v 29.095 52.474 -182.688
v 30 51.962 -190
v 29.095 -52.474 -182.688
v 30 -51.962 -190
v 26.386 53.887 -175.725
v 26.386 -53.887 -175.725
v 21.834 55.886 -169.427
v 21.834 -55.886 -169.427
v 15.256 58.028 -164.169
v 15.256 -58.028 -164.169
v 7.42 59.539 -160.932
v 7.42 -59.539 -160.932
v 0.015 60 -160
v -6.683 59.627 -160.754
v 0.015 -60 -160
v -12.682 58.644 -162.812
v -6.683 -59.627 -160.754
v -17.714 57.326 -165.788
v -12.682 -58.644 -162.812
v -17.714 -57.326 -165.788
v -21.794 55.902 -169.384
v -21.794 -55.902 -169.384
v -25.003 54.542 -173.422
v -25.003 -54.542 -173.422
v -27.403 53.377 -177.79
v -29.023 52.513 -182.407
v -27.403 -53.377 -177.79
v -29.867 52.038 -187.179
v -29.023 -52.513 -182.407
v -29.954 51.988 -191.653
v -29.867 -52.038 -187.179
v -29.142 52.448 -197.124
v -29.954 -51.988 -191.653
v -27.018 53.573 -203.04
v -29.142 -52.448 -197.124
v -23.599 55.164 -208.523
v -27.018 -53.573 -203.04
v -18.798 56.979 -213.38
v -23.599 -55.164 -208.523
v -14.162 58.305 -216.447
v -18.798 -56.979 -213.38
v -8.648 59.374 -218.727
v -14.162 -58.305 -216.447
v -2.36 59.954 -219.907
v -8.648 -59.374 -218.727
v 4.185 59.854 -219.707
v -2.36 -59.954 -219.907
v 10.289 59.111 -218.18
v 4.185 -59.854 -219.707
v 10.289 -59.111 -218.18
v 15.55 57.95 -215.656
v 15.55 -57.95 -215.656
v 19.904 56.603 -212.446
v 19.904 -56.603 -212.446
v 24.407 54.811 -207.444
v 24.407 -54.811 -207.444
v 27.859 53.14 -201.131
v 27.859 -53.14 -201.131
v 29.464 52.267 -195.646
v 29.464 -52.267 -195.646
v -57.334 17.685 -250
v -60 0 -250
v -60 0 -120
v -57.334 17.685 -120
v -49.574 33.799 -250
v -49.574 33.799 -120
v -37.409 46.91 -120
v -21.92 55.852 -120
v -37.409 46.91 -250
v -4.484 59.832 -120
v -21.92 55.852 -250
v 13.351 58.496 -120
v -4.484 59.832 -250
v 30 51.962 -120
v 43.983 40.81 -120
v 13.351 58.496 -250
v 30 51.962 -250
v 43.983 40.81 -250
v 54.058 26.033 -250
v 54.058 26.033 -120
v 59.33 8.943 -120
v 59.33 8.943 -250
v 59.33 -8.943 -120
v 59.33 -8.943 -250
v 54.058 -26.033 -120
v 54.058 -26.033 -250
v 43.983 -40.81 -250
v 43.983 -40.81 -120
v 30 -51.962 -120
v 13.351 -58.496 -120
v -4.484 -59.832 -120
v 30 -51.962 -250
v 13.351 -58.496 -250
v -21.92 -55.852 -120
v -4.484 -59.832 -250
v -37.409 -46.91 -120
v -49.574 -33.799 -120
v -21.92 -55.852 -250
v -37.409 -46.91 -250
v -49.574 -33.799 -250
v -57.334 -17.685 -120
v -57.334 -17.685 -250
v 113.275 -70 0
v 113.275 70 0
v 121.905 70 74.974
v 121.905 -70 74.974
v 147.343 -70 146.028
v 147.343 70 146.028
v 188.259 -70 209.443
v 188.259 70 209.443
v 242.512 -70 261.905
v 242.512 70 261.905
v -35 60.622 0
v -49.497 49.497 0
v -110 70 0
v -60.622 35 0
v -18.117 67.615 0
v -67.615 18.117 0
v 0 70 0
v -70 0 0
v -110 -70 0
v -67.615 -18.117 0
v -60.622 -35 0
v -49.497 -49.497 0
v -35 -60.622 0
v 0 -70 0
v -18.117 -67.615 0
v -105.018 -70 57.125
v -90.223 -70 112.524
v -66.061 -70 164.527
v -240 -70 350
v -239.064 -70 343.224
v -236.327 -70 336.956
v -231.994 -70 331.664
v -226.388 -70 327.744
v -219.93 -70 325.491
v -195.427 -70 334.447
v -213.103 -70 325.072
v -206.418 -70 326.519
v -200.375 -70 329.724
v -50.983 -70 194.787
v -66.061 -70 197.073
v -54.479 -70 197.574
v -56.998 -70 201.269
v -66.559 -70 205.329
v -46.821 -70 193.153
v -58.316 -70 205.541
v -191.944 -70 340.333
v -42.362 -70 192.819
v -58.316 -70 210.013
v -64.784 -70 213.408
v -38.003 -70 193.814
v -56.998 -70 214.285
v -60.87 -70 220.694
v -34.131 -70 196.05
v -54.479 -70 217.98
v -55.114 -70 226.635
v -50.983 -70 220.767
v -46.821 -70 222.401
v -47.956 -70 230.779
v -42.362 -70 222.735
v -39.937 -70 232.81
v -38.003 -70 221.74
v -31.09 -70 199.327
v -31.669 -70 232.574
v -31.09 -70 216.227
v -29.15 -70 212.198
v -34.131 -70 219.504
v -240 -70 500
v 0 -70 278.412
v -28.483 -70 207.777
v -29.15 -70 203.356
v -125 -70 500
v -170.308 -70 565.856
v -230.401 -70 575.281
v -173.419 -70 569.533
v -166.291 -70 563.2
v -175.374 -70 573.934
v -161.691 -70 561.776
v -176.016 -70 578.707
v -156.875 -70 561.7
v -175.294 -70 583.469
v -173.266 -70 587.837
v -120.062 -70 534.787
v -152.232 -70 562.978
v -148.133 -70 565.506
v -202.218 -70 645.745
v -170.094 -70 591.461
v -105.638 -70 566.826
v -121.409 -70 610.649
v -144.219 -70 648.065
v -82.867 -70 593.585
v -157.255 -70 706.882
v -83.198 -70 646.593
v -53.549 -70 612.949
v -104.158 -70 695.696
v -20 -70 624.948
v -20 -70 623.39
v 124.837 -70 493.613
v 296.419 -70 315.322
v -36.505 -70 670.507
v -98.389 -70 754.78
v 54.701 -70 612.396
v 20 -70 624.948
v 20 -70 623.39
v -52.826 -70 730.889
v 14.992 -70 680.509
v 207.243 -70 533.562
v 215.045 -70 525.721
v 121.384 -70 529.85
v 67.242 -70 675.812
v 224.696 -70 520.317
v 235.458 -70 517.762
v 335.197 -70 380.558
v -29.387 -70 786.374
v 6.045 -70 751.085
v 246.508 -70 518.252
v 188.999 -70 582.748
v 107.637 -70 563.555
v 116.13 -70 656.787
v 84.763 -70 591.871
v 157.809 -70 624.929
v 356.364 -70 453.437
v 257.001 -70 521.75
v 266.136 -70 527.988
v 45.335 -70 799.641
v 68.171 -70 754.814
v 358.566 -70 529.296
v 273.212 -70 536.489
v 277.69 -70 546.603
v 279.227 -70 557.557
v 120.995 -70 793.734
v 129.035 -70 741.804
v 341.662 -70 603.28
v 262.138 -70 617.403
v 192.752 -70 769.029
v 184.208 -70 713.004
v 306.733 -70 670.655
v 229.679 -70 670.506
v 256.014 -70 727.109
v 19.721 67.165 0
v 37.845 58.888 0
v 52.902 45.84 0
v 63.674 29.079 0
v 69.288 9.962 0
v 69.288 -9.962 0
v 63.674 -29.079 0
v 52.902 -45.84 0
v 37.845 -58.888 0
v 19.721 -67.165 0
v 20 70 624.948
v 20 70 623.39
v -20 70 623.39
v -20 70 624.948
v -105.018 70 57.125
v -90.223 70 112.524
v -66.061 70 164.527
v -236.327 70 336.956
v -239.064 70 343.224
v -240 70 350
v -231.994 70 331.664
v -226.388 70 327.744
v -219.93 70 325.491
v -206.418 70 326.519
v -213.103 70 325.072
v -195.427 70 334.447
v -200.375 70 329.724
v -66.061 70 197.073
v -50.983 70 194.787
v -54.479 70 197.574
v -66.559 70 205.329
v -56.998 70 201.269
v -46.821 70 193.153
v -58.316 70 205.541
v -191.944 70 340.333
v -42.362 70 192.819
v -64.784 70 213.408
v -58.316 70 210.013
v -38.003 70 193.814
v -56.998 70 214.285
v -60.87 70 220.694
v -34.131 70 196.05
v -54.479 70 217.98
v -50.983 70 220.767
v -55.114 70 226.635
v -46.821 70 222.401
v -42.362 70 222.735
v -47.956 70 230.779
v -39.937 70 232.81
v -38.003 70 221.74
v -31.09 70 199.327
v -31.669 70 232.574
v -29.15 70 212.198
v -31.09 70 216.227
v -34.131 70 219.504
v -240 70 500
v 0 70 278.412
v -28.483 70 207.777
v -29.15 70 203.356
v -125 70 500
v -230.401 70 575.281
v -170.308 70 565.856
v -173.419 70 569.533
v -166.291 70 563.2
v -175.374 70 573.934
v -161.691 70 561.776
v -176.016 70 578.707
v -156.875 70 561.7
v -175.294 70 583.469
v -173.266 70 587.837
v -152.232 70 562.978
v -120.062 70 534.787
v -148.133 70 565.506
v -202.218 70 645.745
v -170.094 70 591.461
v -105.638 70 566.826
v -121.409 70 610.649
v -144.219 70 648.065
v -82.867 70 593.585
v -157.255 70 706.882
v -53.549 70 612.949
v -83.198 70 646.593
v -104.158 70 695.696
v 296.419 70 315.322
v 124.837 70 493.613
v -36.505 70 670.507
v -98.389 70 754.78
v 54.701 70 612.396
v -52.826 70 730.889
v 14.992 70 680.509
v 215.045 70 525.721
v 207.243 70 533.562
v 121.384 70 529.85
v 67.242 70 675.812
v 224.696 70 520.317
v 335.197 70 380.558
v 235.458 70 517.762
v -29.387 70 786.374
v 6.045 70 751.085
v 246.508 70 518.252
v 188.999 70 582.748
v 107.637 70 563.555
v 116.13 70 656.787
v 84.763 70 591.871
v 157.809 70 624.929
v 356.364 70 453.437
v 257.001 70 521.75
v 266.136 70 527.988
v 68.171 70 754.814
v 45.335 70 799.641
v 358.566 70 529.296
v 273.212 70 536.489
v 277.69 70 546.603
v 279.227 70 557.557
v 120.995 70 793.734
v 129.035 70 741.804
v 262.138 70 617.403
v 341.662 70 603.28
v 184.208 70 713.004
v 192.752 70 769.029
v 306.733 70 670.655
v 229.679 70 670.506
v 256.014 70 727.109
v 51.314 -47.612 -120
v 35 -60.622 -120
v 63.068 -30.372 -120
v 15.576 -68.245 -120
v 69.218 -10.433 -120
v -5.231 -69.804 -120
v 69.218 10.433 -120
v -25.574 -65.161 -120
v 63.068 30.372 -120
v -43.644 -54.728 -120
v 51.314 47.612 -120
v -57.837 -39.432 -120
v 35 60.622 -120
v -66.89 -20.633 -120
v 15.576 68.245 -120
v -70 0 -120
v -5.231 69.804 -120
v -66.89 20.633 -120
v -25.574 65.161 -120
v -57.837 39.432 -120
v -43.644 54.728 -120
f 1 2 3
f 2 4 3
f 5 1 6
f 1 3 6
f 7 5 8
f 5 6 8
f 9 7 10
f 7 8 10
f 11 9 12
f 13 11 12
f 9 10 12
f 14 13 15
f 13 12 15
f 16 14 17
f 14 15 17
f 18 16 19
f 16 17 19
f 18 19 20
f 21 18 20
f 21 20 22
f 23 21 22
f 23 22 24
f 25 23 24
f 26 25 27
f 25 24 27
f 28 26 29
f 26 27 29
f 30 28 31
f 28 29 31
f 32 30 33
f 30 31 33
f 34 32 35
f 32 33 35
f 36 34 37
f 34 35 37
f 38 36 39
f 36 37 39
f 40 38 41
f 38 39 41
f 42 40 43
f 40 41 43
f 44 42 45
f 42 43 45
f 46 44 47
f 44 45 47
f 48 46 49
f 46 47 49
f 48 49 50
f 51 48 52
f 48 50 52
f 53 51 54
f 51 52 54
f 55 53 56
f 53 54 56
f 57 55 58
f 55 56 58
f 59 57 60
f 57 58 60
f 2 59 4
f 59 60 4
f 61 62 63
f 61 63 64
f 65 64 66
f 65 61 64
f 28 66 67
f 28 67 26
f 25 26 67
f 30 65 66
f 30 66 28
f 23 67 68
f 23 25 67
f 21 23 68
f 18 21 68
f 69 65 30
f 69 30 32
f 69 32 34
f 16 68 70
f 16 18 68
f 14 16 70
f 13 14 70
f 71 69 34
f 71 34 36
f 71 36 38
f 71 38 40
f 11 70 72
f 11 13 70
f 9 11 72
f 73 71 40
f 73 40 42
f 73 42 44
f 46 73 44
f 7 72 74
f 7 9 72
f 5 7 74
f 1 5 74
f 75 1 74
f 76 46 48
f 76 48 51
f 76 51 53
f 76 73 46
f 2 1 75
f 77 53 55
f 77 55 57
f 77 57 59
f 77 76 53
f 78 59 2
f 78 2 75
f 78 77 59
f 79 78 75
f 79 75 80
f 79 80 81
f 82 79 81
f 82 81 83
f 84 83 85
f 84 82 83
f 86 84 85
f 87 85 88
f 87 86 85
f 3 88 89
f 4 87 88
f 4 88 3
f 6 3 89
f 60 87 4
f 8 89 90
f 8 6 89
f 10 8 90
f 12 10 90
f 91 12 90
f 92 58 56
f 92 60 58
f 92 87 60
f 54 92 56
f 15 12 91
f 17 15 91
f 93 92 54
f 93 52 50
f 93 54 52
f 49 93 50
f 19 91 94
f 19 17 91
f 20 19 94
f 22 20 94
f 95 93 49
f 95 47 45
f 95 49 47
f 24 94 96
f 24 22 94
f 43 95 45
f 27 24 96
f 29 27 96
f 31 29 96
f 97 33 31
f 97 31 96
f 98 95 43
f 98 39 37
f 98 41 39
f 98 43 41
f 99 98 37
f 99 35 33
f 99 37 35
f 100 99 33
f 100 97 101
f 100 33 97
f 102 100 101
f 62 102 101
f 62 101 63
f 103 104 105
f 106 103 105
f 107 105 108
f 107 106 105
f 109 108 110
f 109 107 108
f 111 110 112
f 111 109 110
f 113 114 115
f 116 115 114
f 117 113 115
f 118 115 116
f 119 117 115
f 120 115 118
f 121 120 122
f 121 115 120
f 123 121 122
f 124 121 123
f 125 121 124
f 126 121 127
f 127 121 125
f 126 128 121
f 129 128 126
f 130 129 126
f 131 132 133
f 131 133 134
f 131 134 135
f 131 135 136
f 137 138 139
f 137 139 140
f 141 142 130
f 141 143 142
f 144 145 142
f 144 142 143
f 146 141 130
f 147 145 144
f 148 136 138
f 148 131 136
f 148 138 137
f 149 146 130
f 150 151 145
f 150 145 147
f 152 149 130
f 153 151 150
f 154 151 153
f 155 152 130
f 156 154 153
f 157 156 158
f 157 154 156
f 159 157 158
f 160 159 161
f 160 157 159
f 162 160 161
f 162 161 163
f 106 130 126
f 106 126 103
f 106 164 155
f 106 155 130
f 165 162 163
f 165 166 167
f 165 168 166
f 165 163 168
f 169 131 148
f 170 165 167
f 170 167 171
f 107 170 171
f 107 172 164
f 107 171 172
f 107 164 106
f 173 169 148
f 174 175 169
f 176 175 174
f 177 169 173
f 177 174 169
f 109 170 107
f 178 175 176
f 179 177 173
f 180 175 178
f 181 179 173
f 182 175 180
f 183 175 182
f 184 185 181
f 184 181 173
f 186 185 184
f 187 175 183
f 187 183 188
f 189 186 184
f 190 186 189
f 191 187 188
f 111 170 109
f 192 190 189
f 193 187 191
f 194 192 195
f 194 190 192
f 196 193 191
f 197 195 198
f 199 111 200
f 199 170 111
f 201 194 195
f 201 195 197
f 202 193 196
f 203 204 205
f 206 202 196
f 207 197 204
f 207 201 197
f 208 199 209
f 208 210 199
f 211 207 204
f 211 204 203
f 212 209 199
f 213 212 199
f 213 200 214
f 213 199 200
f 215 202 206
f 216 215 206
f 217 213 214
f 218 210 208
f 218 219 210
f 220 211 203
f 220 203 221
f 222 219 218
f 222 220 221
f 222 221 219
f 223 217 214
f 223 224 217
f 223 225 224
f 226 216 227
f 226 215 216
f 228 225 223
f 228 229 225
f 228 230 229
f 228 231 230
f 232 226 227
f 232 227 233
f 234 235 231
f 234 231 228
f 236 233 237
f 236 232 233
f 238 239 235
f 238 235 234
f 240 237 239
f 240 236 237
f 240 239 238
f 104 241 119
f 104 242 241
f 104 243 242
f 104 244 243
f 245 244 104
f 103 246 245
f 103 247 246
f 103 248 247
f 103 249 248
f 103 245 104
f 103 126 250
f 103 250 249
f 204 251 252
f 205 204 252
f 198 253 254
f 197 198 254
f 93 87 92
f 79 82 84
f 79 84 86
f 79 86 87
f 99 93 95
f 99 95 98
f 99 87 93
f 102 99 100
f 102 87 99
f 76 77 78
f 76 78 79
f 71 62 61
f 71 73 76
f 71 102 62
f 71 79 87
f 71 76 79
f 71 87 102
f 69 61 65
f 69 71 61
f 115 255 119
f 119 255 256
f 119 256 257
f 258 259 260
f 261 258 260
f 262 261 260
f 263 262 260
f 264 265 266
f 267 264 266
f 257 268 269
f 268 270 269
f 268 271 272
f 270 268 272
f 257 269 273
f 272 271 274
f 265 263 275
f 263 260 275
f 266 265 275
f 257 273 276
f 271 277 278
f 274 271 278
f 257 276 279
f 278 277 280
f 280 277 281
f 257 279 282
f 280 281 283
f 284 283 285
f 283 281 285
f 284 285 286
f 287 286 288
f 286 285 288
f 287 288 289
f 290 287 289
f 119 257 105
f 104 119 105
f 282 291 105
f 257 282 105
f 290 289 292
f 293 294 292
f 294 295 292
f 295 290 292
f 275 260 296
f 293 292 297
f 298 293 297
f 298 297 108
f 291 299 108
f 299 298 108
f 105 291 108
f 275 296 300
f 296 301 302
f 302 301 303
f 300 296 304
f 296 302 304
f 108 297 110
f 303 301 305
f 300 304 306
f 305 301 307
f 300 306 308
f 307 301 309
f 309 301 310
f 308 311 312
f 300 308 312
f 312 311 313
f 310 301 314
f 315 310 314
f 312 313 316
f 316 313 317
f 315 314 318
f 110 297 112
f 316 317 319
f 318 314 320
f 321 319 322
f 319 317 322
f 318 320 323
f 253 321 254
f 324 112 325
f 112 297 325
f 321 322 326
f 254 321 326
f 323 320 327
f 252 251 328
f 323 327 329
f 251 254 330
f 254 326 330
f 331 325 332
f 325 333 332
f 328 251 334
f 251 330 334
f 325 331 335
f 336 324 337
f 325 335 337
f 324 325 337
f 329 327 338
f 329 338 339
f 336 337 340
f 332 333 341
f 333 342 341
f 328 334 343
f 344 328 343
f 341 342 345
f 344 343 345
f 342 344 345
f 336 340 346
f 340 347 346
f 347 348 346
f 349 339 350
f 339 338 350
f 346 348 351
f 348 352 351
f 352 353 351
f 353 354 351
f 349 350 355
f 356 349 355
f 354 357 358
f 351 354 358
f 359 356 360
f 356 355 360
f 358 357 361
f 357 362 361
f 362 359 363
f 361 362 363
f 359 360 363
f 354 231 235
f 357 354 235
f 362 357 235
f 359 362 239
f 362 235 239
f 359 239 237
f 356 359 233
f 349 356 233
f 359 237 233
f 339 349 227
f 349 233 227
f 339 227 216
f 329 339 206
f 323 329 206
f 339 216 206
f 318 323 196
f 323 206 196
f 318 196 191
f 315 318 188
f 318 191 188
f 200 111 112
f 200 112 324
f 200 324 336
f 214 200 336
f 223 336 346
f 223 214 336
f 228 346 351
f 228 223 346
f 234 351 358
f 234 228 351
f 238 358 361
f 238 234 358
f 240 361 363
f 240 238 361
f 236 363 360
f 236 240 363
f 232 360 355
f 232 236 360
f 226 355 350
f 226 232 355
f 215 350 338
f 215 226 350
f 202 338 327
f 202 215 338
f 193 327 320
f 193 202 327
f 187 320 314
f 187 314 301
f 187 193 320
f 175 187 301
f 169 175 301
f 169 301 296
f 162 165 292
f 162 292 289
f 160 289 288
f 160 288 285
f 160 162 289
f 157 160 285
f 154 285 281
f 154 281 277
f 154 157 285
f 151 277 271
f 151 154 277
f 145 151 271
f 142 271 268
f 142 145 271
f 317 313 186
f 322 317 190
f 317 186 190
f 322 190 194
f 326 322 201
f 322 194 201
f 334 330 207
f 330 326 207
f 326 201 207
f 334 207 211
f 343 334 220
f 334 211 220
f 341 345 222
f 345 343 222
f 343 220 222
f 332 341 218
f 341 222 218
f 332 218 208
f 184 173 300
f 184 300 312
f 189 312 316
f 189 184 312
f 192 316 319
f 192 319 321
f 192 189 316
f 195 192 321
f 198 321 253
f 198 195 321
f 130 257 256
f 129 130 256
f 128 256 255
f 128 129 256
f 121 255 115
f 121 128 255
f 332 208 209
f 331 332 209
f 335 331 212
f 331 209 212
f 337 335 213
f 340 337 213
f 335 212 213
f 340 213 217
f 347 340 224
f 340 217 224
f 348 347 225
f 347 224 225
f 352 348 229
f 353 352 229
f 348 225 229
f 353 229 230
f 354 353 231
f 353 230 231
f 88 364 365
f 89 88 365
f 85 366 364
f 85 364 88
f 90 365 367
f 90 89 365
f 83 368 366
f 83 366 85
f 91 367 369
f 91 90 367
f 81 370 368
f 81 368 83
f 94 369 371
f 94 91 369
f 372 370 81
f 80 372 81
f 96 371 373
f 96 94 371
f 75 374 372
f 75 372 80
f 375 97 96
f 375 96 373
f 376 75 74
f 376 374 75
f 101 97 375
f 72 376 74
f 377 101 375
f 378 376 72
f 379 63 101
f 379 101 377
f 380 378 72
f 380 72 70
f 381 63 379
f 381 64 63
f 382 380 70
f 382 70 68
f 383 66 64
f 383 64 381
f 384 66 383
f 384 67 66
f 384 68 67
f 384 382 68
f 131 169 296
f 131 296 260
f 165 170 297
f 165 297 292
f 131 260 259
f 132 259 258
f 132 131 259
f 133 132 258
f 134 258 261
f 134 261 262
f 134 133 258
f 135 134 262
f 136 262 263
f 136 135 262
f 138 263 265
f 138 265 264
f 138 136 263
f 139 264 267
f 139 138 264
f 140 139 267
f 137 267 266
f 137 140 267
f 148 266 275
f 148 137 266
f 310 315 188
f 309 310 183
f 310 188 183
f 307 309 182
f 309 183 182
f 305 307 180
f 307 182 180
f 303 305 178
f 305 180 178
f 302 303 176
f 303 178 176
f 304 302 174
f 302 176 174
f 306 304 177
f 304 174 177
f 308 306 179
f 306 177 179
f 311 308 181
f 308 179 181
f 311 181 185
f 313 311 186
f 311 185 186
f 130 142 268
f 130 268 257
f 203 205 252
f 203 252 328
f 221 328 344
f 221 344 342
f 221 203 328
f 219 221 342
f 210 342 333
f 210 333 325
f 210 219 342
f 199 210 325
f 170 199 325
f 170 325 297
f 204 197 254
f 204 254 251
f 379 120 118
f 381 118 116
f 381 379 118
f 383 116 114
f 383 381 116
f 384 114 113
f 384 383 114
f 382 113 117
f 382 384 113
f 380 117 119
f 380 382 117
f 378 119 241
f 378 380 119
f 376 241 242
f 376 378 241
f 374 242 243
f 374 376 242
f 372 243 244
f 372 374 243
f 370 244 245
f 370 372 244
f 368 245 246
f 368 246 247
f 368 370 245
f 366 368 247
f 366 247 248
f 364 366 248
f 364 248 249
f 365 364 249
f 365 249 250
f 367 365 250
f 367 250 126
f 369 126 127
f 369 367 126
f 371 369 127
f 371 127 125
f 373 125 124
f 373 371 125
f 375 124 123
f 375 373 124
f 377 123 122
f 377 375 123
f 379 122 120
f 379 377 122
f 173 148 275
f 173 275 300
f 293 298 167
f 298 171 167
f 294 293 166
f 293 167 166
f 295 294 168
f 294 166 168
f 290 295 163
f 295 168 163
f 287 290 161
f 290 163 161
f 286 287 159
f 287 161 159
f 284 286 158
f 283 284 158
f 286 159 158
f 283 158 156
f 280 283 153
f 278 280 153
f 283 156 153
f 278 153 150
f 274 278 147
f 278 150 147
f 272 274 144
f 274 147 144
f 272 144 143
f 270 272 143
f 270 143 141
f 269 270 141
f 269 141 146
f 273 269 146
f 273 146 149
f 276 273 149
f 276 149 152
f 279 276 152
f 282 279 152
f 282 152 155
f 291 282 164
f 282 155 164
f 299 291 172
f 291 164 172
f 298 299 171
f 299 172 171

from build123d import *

# Parameters (mm, degrees)
F3_DEPTH = 70
F4_R     = 30
F5_DEPTH = 112
F6_R     = 15
F7_DEPTH = 163
F9_DEPTH = 150


with BuildPart() as f2:
    # F1 (on Front) → F2 (revolve)
    with BuildSketch(Plane.XZ):
        Polygon((-60, -120), (-60, -250), (0, -250), (0, 0), (-70, 0), (-70, -120), align=None)
    revolve(axis=Axis((0, 0, -125), (0, 0, -1)))

    # F0 (on Front) → F3 (join, symmetric)
    with BuildSketch(Plane.XZ):
        with BuildLine():
            ThreePointArc((113.275358, 0), (147.343032, 146.027594), (242.512075, 261.904762))
            ThreePointArc((242.512075, 261.904762), (192.752359, 769.029387), (-240, 500))
            Line((-240, 500), (-125, 500))
            ThreePointArc((-125, 500), (-95.197164, 581.009259), (-20, 623.389627))
            Line((-20, 623.389627), (-20, 624.947867))
            Line((-20, 624.947867), (20, 624.947867))
            Line((20, 624.947867), (20, 623.389627))
            ThreePointArc((20, 623.389627), (97.236318, 578.549974), (124.836727, 493.613169))
            Line((124.836727, 493.613169), (0, 278.411619))
            Line((0, 278.411619), (-31.669397, 232.573897))
            ThreePointArc((-31.669397, 232.573897), (-58.197727, 223.86417), (-66.061109, 197.072774))
            Line((-66.061109, 197.072774), (-66.061109, 164.52672))
            ThreePointArc((-66.061109, 164.52672), (-98.826102, 85.146444), (-110, 0))
            Line((-110, 0), (113.275358, 0))
        make_face()
        with BuildLine():
            Line((-125, 500), (-240, 500))
            Line((-240, 500), (-240, 350))
            ThreePointArc((-240, 350), (-219.930134, 325.490945), (-191.944498, 340.333365))
            Line((-191.944498, 340.333365), (-125, 500))
        make_face()
    extrude(amount=F3_DEPTH, both=True)

    # F4 (on Front) → F5 (cut, symmetric)
    with BuildSketch(Plane.XZ):
        with Locations((0, -190)):
            Circle(F4_R)
    extrude(amount=F5_DEPTH, both=True, mode=Mode.SUBTRACT)

    # F6 (on face) → F7 (cut, symmetric)
    with BuildSketch(Plane.XZ.offset(70)):
        with Locations((-43.483209, 207.776994)):
            Circle(F6_R)
    extrude(amount=F7_DEPTH, both=True, mode=Mode.SUBTRACT)

    # F8 (on face) → F9 (cut)
    with BuildSketch(Plane.XZ.offset(70)):
        with BuildLine():
            ThreePointArc((207.243012, 533.562227), (251.876022, 519.636331), (279.226912, 557.556839))
            ThreePointArc((279.226912, 557.556839), (68.171297, 754.813507), (-170.094242, 591.460519))
            ThreePointArc((-170.094242, 591.460519), (-171.994625, 567.583929), (-148.132823, 565.506094))
            ThreePointArc((-148.132823, 565.506094), (41.282548, 680.00219), (207.243012, 533.562227))
        make_face()
    extrude(amount=-F9_DEPTH, mode=Mode.SUBTRACT)


solid = f2.part
